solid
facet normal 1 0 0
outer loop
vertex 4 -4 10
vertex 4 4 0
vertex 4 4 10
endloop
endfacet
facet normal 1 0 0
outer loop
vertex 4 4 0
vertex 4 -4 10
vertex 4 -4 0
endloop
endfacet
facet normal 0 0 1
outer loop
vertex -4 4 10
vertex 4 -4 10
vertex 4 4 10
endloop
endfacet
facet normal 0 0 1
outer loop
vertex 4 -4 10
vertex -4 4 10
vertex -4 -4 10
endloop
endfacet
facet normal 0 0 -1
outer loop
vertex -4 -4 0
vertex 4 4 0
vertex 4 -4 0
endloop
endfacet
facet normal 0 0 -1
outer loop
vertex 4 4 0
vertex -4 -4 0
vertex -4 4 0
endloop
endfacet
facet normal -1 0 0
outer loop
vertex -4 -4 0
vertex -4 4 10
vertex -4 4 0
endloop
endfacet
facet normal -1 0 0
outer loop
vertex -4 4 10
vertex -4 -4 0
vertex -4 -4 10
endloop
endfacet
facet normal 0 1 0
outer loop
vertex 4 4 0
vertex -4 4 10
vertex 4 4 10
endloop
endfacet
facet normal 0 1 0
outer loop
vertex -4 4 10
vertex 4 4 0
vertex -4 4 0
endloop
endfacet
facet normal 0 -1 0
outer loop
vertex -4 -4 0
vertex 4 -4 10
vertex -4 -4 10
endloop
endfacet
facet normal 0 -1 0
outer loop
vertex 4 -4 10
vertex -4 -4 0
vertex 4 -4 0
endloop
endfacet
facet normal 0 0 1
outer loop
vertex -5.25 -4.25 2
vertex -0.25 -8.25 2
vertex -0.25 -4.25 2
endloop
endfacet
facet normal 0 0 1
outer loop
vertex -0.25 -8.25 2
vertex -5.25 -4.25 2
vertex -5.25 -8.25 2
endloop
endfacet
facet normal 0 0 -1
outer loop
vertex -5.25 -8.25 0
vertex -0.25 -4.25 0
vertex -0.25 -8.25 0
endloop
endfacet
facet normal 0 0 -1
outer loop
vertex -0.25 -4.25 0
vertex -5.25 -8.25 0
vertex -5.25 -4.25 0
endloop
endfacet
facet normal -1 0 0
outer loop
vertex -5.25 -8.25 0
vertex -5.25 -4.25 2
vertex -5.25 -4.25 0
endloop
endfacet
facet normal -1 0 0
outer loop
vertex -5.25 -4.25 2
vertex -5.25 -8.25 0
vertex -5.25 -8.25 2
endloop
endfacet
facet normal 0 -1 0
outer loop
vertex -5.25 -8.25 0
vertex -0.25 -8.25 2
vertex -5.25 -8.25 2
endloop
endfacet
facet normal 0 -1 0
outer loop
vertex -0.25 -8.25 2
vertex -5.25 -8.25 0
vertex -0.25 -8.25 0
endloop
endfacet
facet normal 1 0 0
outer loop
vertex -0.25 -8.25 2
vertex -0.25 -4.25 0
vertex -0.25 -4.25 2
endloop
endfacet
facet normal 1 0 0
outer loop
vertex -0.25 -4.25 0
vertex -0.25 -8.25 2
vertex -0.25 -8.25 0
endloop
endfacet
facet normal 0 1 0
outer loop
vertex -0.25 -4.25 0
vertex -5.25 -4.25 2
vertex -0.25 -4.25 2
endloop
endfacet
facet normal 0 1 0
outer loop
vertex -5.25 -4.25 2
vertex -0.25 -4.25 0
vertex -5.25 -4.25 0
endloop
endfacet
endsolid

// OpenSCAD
translate([0, 0, 5]) color([0,1,0,0.9]) cube([8, 8, 10], center=true);
translate([-5.0, -8.0, 1]) color([1,0,0]) cube([0.5, 0.5, 2], center=true);
translate([-4.5, -8.0, 1]) color([1,0,0]) cube([0.5, 0.5, 2], center=true);
translate([-4.0, -8.0, 1]) color([1,0,0]) cube([0.5, 0.5, 2], center=true);
translate([-3.5, -8.0, 1]) color([1,0,0]) cube([0.5, 0.5, 2], center=true);
translate([-3.0, -8.0, 1]) color([1,0,0]) cube([0.5, 0.5, 2], center=true);
translate([-2.5, -8.0, 1]) color([1,0,0]) cube([0.5, 0.5, 2], center=true);
translate([-2.0, -8.0, 1]) color([1,0,0]) cube([0.5, 0.5, 2], center=true);
translate([-1.5, -8.0, 1]) color([1,0,0]) cube([0.5, 0.5, 2], center=true);
translate([-1.0, -8.0, 1]) color([1,0,0]) cube([0.5, 0.5, 2], center=true);
translate([-0.5, -8.0, 1]) color([1,0,0]) cube([0.5, 0.5, 2], center=true);
translate([-5.0, -7.5, 1]) color([1,0,0]) cube([0.5, 0.5, 2], center=true);
translate([-4.5, -7.5, 1]) color([1,0,0]) cube([0.5, 0.5, 2], center=true);
translate([-4.0, -7.5, 1]) color([1,0,0]) cube([0.5, 0.5, 2], center=true);
translate([-3.5, -7.5, 1]) color([1,0,0]) cube([0.5, 0.5, 2], center=true);
translate([-3.0, -7.5, 1]) color([1,0,0]) cube([0.5, 0.5, 2], center=true);
translate([-2.5, -7.5, 1]) color([1,0,0]) cube([0.5, 0.5, 2], center=true);
translate([-2.0, -7.5, 1]) color([1,0,0]) cube([0.5, 0.5, 2], center=true);
translate([-1.5, -7.5, 1]) color([1,0,0]) cube([0.5, 0.5, 2], center=true);
translate([-1.0, -7.5, 1]) color([1,0,0]) cube([0.5, 0.5, 2], center=true);
translate([-0.5, -7.5, 1]) color([1,0,0]) cube([0.5, 0.5, 2], center=true);
translate([-5.0, -7.0, 1]) color([1,0,0]) cube([0.5, 0.5, 2], center=true);
translate([-4.5, -7.0, 1]) color([1,0,0]) cube([0.5, 0.5, 2], center=true);
translate([-4.0, -7.0, 1]) color([1,0,0]) cube([0.5, 0.5, 2], center=true);
translate([-3.5, -7.0, 1]) color([1,0,0]) cube([0.5, 0.5, 2], center=true);
translate([-3.0, -7.0, 1]) color([1,0,0]) cube([0.5, 0.5, 2], center=true);
translate([-2.5, -7.0, 1]) color([1,0,0]) cube([0.5, 0.5, 2], center=true);
translate([-2.0, -7.0, 1]) color([1,0,0]) cube([0.5, 0.5, 2], center=true);
translate([-1.5, -7.0, 1]) color([1,0,0]) cube([0.5, 0.5, 2], center=true);
translate([-1.0, -7.0, 1]) color([1,0,0]) cube([0.5, 0.5, 2], center=true);
translate([-0.5, -7.0, 1]) color([1,0,0]) cube([0.5, 0.5, 2], center=true);
translate([-5.0, -6.5, 1]) color([1,0,0]) cube([0.5, 0.5, 2], center=true);
translate([-4.5, -6.5, 1]) color([1,0,0]) cube([0.5, 0.5, 2], center=true);
translate([-4.0, -6.5, 1]) color([1,0,0]) cube([0.5, 0.5, 2], center=true);
translate([-3.5, -6.5, 1]) color([1,0,0]) cube([0.5, 0.5, 2], center=true);
translate([-3.0, -6.5, 1]) color([1,0,0]) cube([0.5, 0.5, 2], center=true);
translate([-2.5, -6.5, 1]) color([1,0,0]) cube([0.5, 0.5, 2], center=true);
translate([-2.0, -6.5, 1]) color([1,0,0]) cube([0.5, 0.5, 2], center=true);
translate([-1.5, -6.5, 1]) color([1,0,0]) cube([0.5, 0.5, 2], center=true);
translate([-1.0, -6.5, 1]) color([1,0,0]) cube([0.5, 0.5, 2], center=true);
translate([-0.5, -6.5, 1]) color([1,0,0]) cube([0.5, 0.5, 2], center=true);
translate([-5.0, -6.0, 1]) color([1,0,0]) cube([0.5, 0.5, 2], center=true);
translate([-4.5, -6.0, 1]) color([1,0,0]) cube([0.5, 0.5, 2], center=true);
translate([-4.0, -6.0, 1]) color([1,0,0]) cube([0.5, 0.5, 2], center=true);
translate([-3.5, -6.0, 1]) color([1,0,0]) cube([0.5, 0.5, 2], center=true);
translate([-3.0, -6.0, 1]) color([1,0,0]) cube([0.5, 0.5, 2], center=true);
translate([-2.5, -6.0, 1]) color([1,0,0]) cube([0.5, 0.5, 2], center=true);
translate([-2.0, -6.0, 1]) color([1,0,0]) cube([0.5, 0.5, 2], center=true);
translate([-1.5, -6.0, 1]) color([1,0,0]) cube([0.5, 0.5, 2], center=true);
translate([-1.0, -6.0, 1]) color([1,0,0]) cube([0.5, 0.5, 2], center=true);
translate([-0.5, -6.0, 1]) color([1,0,0]) cube([0.5, 0.5, 2], center=true);
translate([-5.0, -5.5, 1]) color([1,0,0]) cube([0.5, 0.5, 2], center=true);
translate([-4.5, -5.5, 1]) color([1,0,0]) cube([0.5, 0.5, 2], center=true);
translate([-4.0, -5.5, 1]) color([1,0,0]) cube([0.5, 0.5, 2], center=true);
translate([-3.5, -5.5, 1]) color([1,0,0]) cube([0.5, 0.5, 2], center=true);
translate([-3.0, -5.5, 1]) color([1,0,0]) cube([0.5, 0.5, 2], center=true);
translate([-2.5, -5.5, 1]) color([1,0,0]) cube([0.5, 0.5, 2], center=true);
translate([-2.0, -5.5, 1]) color([1,0,0]) cube([0.5, 0.5, 2], center=true);
translate([-1.5, -5.5, 1]) color([1,0,0]) cube([0.5, 0.5, 2], center=true);
translate([-1.0, -5.5, 1]) color([1,0,0]) cube([0.5, 0.5, 2], center=true);
translate([-0.5, -5.5, 1]) color([1,0,0]) cube([0.5, 0.5, 2], center=true);
translate([-5.0, -5.0, 1]) color([1,0,0]) cube([0.5, 0.5, 2], center=true);
translate([-4.5, -5.0, 1]) color([1,0,0]) cube([0.5, 0.5, 2], center=true);
translate([-4.0, -5.0, 1]) color([1,0,0]) cube([0.5, 0.5, 2], center=true);
translate([-3.5, -5.0, 1]) color([1,0,0]) cube([0.5, 0.5, 2], center=true);
translate([-3.0, -5.0, 1]) color([1,0,0]) cube([0.5, 0.5, 2], center=true);
translate([-2.5, -5.0, 1]) color([1,0,0]) cube([0.5, 0.5, 2], center=true);
translate([-2.0, -5.0, 1]) color([1,0,0]) cube([0.5, 0.5, 2], center=true);
translate([-1.5, -5.0, 1]) color([1,0,0]) cube([0.5, 0.5, 2], center=true);
translate([-1.0, -5.0, 1]) color([1,0,0]) cube([0.5, 0.5, 2], center=true);
translate([-0.5, -5.0, 1]) color([1,0,0]) cube([0.5, 0.5, 2], center=true);
translate([-5.0, -4.5, 1]) color([1,0,0]) cube([0.5, 0.5, 2], center=true);
translate([-4.5, -4.5, 1]) color([1,0,0]) cube([0.5, 0.5, 2], center=true);
translate([-4.0, -4.5, 1]) color([1,0,0]) cube([0.5, 0.5, 2], center=true);
translate([-3.5, -4.5, 1]) color([1,0,0]) cube([0.5, 0.5, 2], center=true);
translate([-3.0, -4.5, 1]) color([1,0,0]) cube([0.5, 0.5, 2], center=true);
translate([-2.5, -4.5, 1]) color([1,0,0]) cube([0.5, 0.5, 2], center=true);
translate([-2.0, -4.5, 1]) color([1,0,0]) cube([0.5, 0.5, 2], center=true);
translate([-1.5, -4.5, 1]) color([1,0,0]) cube([0.5, 0.5, 2], center=true);
translate([-1.0, -4.5, 1]) color([1,0,0]) cube([0.5, 0.5, 2], center=true);
translate([-0.5, -4.5, 1]) color([1,0,0]) cube([0.5, 0.5, 2], center=true);
